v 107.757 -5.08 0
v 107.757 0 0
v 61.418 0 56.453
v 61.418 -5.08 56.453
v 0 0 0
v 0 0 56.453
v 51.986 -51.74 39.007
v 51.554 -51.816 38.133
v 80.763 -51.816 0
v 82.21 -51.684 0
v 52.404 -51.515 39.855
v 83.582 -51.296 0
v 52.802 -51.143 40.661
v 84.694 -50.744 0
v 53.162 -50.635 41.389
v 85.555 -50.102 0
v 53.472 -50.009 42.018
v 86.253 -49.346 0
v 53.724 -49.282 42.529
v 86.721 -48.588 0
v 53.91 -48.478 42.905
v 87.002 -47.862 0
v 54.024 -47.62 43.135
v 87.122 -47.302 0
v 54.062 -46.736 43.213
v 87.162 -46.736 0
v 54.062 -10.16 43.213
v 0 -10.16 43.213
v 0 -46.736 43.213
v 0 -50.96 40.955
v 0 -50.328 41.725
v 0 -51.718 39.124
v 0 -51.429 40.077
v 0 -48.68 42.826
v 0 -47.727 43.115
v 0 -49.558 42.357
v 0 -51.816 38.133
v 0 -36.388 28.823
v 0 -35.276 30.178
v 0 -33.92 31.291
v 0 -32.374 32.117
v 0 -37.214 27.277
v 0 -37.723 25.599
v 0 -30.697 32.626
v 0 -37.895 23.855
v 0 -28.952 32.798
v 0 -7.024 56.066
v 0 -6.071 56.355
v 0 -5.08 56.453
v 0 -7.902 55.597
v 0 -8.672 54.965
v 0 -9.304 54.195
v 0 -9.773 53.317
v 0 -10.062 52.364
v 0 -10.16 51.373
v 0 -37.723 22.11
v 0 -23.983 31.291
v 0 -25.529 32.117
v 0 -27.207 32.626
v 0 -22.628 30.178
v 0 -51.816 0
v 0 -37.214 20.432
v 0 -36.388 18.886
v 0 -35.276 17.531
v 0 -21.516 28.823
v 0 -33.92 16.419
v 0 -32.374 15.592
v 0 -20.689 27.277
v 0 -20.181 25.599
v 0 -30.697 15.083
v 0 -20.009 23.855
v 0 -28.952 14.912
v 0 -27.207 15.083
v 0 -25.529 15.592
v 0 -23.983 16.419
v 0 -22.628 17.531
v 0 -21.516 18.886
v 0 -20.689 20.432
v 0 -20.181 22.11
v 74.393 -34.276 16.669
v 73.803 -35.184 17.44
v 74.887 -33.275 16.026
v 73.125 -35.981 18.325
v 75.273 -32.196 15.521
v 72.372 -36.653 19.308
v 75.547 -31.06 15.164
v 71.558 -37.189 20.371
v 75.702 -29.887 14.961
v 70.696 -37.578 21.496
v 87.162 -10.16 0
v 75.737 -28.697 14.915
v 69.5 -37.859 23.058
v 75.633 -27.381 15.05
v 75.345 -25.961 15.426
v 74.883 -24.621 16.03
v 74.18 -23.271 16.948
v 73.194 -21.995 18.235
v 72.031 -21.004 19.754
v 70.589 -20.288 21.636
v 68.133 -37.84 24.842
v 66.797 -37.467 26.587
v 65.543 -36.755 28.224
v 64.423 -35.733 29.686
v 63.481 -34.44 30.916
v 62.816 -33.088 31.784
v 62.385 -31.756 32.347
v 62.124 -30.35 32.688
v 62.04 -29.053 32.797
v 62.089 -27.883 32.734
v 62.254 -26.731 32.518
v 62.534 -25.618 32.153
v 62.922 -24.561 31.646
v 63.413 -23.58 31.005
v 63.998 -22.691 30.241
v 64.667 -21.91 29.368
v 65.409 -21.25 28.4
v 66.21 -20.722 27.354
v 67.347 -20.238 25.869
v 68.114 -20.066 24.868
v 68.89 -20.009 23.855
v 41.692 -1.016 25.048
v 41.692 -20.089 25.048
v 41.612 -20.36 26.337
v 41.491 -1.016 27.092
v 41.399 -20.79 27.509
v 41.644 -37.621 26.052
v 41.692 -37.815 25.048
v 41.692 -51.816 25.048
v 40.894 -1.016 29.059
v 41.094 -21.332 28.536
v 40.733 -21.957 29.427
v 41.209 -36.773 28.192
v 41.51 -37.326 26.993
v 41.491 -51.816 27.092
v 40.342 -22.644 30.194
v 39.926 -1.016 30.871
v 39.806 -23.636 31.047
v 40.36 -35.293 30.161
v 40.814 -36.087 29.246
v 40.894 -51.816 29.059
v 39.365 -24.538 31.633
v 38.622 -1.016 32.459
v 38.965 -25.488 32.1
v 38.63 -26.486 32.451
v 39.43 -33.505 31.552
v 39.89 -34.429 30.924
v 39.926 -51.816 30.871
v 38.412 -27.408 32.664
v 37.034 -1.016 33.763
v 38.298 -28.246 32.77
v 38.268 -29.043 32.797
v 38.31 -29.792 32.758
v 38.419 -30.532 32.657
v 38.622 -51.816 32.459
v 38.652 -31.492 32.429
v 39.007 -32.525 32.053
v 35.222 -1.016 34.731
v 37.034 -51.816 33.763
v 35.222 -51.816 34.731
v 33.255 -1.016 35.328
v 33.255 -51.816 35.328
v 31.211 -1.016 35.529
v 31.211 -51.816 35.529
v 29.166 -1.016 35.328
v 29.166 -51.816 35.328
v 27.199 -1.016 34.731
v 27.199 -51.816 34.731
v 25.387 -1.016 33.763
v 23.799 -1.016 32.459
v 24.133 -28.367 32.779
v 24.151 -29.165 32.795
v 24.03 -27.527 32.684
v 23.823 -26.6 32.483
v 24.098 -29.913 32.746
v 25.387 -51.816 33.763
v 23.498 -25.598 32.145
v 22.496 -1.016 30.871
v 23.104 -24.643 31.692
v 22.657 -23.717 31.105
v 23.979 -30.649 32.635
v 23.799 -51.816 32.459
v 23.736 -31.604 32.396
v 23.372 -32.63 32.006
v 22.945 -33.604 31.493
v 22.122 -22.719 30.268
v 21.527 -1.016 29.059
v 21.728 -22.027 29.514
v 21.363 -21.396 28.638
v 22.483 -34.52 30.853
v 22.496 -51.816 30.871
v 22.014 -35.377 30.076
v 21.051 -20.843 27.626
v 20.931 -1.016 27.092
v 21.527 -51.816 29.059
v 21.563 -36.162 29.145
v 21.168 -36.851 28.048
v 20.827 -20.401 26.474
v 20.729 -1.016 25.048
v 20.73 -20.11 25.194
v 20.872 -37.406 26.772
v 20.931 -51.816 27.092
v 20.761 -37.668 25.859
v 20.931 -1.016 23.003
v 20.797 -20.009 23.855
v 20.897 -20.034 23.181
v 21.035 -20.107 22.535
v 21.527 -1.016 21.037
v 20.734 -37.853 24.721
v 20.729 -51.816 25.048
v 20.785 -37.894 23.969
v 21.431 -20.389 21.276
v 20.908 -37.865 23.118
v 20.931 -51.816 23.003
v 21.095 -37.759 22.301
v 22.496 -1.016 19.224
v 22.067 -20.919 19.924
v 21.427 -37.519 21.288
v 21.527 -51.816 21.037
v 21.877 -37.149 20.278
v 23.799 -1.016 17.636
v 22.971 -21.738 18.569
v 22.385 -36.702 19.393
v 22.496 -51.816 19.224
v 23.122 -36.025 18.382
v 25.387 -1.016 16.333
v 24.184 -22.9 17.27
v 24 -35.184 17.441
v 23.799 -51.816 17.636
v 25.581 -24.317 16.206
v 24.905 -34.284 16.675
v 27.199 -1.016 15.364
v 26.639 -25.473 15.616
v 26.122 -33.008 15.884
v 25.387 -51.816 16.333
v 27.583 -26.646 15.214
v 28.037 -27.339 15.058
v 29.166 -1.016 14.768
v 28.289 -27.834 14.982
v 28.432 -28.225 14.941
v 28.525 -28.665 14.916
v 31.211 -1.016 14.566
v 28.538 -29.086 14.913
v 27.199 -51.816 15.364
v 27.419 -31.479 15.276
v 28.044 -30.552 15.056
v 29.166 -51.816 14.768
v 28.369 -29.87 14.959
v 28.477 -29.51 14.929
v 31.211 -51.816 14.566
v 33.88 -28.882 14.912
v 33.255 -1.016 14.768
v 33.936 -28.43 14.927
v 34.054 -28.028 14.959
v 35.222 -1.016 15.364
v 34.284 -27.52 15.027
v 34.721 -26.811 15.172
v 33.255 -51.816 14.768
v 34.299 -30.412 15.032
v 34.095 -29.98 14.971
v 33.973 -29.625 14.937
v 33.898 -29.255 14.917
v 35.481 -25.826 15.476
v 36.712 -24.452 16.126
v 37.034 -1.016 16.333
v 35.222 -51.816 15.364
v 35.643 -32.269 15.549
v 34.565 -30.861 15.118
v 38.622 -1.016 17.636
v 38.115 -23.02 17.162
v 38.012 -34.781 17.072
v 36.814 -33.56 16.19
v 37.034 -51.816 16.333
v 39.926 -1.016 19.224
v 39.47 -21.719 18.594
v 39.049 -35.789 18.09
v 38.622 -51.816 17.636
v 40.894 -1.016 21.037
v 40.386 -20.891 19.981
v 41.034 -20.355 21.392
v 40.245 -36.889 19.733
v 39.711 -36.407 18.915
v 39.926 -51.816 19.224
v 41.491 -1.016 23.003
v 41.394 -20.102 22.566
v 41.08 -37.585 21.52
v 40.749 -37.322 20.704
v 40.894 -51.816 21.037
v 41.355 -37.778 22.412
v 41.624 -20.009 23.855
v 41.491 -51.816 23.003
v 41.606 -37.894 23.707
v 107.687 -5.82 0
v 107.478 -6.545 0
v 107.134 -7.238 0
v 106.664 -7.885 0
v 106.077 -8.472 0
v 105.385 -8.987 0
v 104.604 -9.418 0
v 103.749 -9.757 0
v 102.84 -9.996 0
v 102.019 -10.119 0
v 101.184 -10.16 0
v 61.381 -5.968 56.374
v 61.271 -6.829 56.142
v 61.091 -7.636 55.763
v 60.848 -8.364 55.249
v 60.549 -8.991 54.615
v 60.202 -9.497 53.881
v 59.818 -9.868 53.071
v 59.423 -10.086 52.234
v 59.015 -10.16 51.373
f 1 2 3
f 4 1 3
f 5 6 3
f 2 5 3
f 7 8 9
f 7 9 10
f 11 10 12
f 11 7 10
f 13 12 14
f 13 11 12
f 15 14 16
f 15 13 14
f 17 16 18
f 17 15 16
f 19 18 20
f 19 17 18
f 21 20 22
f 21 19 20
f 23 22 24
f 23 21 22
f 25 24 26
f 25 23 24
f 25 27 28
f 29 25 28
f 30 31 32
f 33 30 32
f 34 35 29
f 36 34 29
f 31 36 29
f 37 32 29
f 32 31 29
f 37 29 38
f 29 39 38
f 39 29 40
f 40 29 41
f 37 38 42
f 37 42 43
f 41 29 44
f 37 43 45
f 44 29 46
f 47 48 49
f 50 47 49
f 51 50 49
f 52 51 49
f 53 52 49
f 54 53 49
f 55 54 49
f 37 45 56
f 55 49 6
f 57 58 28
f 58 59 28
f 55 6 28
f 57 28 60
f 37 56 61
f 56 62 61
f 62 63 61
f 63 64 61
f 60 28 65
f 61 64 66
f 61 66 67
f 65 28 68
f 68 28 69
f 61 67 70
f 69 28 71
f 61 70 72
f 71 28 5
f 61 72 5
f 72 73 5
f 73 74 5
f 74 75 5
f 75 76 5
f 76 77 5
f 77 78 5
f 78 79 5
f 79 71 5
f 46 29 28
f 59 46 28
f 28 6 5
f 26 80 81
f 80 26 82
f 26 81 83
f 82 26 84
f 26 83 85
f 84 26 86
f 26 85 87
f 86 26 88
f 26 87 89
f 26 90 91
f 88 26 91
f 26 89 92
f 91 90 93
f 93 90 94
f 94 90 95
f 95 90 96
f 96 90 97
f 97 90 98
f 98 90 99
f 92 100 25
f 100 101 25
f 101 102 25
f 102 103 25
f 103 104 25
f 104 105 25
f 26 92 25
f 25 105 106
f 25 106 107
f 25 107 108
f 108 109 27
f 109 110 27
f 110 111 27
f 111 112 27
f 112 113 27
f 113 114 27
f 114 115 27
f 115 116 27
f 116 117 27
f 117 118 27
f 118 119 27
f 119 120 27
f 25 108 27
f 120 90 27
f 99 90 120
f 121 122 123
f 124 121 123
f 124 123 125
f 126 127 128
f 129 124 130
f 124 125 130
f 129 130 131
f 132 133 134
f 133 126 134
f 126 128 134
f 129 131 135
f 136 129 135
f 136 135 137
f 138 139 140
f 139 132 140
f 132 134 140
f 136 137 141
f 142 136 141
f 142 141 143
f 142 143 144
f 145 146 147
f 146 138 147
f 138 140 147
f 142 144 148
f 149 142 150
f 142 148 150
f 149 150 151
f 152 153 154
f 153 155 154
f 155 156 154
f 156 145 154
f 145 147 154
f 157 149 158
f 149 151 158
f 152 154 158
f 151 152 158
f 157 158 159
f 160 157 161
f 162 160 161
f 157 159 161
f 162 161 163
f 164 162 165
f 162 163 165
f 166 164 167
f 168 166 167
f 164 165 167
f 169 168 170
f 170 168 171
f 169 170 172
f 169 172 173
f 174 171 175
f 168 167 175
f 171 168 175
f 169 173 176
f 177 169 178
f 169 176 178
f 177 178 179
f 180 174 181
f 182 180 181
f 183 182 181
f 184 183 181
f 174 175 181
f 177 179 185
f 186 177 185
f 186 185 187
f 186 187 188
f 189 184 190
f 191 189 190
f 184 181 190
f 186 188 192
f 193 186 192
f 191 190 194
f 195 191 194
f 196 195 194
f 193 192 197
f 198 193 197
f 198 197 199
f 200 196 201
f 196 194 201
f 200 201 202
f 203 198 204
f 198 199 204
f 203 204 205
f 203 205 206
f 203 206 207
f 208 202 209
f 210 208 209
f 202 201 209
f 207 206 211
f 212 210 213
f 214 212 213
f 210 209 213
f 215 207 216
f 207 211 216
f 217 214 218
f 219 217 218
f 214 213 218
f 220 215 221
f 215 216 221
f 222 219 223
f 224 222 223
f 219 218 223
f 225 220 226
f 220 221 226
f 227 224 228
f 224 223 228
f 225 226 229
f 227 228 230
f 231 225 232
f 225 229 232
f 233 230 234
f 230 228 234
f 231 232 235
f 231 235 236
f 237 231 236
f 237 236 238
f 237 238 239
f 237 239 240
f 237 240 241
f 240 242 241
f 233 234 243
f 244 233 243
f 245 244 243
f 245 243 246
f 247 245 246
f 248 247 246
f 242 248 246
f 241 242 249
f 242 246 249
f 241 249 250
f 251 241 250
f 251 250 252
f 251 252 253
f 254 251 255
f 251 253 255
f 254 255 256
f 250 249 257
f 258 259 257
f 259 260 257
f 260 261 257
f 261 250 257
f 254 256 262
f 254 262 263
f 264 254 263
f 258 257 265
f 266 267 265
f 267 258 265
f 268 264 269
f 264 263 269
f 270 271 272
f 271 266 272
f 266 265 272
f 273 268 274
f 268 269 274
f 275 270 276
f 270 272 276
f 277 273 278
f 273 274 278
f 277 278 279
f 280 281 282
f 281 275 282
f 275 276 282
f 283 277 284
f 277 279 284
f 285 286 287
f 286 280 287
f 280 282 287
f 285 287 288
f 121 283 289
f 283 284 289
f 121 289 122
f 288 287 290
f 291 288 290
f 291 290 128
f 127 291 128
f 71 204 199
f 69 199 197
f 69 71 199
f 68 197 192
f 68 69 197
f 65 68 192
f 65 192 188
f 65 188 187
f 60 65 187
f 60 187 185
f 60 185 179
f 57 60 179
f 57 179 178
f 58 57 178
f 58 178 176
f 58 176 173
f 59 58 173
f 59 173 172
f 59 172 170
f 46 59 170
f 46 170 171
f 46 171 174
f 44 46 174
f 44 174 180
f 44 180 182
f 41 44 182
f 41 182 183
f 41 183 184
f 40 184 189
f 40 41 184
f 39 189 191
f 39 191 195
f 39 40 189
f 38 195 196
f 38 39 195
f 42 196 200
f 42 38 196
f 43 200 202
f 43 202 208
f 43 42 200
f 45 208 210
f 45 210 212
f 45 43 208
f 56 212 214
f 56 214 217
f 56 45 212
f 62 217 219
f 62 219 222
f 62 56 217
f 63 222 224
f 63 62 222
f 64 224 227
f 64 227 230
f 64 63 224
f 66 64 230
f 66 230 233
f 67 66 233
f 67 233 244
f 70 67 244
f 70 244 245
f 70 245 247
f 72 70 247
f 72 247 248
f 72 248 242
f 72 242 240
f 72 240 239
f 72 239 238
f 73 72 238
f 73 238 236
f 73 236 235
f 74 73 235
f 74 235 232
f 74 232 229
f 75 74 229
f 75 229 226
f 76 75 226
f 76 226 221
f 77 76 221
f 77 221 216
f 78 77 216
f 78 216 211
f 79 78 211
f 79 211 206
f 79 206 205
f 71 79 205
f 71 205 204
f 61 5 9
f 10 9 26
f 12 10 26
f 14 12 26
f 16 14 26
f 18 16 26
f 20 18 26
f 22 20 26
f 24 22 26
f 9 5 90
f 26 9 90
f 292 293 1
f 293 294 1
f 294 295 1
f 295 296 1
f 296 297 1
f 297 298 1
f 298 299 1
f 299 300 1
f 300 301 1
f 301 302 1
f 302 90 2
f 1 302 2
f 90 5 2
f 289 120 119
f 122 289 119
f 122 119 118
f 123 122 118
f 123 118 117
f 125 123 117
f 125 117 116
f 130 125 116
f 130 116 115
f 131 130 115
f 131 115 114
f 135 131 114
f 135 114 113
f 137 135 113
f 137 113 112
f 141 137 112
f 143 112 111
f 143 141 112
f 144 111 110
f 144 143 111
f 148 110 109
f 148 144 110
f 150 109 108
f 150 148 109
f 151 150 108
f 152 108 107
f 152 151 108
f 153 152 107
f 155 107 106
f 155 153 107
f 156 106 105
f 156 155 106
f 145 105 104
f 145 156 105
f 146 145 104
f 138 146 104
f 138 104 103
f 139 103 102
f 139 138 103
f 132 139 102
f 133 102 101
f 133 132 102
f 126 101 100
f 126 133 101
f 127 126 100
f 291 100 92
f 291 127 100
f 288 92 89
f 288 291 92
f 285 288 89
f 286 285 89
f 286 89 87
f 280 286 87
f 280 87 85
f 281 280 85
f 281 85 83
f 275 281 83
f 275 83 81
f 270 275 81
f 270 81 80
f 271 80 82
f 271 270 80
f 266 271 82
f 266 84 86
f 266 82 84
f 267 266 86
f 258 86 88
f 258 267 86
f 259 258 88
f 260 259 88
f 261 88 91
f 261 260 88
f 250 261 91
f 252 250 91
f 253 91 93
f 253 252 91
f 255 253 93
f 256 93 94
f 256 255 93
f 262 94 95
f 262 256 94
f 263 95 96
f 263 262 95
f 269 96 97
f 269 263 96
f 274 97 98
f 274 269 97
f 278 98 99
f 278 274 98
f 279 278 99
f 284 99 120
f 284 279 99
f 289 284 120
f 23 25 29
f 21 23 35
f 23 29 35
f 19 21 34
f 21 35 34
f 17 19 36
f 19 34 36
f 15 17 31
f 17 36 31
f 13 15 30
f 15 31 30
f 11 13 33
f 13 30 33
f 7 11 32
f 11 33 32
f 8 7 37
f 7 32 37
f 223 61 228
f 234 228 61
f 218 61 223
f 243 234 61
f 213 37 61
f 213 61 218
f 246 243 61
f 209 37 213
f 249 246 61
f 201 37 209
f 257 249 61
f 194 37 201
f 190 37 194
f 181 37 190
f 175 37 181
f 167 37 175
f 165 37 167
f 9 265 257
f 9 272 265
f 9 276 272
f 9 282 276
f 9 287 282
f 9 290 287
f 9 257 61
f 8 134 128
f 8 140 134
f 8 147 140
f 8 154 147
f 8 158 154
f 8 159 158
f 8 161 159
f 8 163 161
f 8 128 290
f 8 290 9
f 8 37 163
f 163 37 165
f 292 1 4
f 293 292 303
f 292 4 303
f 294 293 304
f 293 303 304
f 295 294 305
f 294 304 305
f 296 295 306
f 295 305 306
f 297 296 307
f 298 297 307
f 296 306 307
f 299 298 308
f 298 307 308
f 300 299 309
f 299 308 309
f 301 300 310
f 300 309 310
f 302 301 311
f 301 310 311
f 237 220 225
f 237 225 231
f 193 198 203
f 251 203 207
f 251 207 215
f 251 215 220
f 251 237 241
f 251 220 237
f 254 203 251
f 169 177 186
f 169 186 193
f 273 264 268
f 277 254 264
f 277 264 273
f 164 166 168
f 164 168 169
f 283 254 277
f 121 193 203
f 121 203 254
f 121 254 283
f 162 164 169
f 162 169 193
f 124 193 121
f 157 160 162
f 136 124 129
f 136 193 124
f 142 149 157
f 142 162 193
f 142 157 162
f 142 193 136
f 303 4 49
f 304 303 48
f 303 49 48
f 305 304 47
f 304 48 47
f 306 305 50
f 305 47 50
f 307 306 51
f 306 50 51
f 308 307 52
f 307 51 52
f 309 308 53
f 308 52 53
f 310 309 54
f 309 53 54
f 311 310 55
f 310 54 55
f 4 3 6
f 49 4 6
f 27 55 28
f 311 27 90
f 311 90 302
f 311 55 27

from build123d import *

# Parameters (mm, degrees)
F1_DEPTH = 51.816
F2_DEPTH = 10.16
F3_R     = 8.94315
F4_DEPTH = 101.6
F5_R     = 9.219665
F6_DEPTH = 50.8
F7_R     = 10.48142
F8_DEPTH = 50.8
F9_R     = 5.08


with BuildPart() as f1:
    # F0 (on Front) → F1 (new body)
    with BuildSketch(Plane.XZ):
        Polygon((54.062217, 43.212991), (0, 43.212991), (0, 0), (87.161534, 0), align=None)
    extrude(amount=F1_DEPTH)

    # F0 (on Front) → F2 (join)
    with BuildSketch(Plane.XZ):
        Polygon((61.417621, 56.452714), (0, 56.452714), (0, 43.212991), (54.062217, 43.212991), (87.161534, 0), (107.756652, 0), align=None)
    extrude(amount=F2_DEPTH)

    # F3 (on Right) → F4 (cut)
    with BuildSketch(Plane.YZ):
        with Locations((-28.951842, 23.85469)):
            Circle(F3_R)
    extrude(amount=F4_DEPTH, mode=Mode.SUBTRACT)

    # F5 (on face) → F6 (cut)
    with BuildSketch(Plane.XZ.offset(51.816)):
        with Locations((32.87245, 25.28506)):
            Circle(F5_R)
    extrude(amount=F6_DEPTH, mode=Mode.SUBTRACT)

    # F7 (on face) → F8 (cut)
    with BuildSketch(Plane.XZ.offset(51.816)):
        with Locations((31.210523, 25.047641)):
            Circle(F7_R)
    extrude(amount=-F8_DEPTH, mode=Mode.SUBTRACT)

    # F9
    f9_edges = [f1.edges().sort_by_distance(p)[0] for p in [
        (30.70881, -10.16, 56.452714),
        (84.587136, -10.16, 28.226357),
        (27.031109, -51.816, 43.212991),
        (70.611876, -51.816, 21.606496),
    ]]
    fillet(f9_edges, radius=F9_R)


solid = f1.part
